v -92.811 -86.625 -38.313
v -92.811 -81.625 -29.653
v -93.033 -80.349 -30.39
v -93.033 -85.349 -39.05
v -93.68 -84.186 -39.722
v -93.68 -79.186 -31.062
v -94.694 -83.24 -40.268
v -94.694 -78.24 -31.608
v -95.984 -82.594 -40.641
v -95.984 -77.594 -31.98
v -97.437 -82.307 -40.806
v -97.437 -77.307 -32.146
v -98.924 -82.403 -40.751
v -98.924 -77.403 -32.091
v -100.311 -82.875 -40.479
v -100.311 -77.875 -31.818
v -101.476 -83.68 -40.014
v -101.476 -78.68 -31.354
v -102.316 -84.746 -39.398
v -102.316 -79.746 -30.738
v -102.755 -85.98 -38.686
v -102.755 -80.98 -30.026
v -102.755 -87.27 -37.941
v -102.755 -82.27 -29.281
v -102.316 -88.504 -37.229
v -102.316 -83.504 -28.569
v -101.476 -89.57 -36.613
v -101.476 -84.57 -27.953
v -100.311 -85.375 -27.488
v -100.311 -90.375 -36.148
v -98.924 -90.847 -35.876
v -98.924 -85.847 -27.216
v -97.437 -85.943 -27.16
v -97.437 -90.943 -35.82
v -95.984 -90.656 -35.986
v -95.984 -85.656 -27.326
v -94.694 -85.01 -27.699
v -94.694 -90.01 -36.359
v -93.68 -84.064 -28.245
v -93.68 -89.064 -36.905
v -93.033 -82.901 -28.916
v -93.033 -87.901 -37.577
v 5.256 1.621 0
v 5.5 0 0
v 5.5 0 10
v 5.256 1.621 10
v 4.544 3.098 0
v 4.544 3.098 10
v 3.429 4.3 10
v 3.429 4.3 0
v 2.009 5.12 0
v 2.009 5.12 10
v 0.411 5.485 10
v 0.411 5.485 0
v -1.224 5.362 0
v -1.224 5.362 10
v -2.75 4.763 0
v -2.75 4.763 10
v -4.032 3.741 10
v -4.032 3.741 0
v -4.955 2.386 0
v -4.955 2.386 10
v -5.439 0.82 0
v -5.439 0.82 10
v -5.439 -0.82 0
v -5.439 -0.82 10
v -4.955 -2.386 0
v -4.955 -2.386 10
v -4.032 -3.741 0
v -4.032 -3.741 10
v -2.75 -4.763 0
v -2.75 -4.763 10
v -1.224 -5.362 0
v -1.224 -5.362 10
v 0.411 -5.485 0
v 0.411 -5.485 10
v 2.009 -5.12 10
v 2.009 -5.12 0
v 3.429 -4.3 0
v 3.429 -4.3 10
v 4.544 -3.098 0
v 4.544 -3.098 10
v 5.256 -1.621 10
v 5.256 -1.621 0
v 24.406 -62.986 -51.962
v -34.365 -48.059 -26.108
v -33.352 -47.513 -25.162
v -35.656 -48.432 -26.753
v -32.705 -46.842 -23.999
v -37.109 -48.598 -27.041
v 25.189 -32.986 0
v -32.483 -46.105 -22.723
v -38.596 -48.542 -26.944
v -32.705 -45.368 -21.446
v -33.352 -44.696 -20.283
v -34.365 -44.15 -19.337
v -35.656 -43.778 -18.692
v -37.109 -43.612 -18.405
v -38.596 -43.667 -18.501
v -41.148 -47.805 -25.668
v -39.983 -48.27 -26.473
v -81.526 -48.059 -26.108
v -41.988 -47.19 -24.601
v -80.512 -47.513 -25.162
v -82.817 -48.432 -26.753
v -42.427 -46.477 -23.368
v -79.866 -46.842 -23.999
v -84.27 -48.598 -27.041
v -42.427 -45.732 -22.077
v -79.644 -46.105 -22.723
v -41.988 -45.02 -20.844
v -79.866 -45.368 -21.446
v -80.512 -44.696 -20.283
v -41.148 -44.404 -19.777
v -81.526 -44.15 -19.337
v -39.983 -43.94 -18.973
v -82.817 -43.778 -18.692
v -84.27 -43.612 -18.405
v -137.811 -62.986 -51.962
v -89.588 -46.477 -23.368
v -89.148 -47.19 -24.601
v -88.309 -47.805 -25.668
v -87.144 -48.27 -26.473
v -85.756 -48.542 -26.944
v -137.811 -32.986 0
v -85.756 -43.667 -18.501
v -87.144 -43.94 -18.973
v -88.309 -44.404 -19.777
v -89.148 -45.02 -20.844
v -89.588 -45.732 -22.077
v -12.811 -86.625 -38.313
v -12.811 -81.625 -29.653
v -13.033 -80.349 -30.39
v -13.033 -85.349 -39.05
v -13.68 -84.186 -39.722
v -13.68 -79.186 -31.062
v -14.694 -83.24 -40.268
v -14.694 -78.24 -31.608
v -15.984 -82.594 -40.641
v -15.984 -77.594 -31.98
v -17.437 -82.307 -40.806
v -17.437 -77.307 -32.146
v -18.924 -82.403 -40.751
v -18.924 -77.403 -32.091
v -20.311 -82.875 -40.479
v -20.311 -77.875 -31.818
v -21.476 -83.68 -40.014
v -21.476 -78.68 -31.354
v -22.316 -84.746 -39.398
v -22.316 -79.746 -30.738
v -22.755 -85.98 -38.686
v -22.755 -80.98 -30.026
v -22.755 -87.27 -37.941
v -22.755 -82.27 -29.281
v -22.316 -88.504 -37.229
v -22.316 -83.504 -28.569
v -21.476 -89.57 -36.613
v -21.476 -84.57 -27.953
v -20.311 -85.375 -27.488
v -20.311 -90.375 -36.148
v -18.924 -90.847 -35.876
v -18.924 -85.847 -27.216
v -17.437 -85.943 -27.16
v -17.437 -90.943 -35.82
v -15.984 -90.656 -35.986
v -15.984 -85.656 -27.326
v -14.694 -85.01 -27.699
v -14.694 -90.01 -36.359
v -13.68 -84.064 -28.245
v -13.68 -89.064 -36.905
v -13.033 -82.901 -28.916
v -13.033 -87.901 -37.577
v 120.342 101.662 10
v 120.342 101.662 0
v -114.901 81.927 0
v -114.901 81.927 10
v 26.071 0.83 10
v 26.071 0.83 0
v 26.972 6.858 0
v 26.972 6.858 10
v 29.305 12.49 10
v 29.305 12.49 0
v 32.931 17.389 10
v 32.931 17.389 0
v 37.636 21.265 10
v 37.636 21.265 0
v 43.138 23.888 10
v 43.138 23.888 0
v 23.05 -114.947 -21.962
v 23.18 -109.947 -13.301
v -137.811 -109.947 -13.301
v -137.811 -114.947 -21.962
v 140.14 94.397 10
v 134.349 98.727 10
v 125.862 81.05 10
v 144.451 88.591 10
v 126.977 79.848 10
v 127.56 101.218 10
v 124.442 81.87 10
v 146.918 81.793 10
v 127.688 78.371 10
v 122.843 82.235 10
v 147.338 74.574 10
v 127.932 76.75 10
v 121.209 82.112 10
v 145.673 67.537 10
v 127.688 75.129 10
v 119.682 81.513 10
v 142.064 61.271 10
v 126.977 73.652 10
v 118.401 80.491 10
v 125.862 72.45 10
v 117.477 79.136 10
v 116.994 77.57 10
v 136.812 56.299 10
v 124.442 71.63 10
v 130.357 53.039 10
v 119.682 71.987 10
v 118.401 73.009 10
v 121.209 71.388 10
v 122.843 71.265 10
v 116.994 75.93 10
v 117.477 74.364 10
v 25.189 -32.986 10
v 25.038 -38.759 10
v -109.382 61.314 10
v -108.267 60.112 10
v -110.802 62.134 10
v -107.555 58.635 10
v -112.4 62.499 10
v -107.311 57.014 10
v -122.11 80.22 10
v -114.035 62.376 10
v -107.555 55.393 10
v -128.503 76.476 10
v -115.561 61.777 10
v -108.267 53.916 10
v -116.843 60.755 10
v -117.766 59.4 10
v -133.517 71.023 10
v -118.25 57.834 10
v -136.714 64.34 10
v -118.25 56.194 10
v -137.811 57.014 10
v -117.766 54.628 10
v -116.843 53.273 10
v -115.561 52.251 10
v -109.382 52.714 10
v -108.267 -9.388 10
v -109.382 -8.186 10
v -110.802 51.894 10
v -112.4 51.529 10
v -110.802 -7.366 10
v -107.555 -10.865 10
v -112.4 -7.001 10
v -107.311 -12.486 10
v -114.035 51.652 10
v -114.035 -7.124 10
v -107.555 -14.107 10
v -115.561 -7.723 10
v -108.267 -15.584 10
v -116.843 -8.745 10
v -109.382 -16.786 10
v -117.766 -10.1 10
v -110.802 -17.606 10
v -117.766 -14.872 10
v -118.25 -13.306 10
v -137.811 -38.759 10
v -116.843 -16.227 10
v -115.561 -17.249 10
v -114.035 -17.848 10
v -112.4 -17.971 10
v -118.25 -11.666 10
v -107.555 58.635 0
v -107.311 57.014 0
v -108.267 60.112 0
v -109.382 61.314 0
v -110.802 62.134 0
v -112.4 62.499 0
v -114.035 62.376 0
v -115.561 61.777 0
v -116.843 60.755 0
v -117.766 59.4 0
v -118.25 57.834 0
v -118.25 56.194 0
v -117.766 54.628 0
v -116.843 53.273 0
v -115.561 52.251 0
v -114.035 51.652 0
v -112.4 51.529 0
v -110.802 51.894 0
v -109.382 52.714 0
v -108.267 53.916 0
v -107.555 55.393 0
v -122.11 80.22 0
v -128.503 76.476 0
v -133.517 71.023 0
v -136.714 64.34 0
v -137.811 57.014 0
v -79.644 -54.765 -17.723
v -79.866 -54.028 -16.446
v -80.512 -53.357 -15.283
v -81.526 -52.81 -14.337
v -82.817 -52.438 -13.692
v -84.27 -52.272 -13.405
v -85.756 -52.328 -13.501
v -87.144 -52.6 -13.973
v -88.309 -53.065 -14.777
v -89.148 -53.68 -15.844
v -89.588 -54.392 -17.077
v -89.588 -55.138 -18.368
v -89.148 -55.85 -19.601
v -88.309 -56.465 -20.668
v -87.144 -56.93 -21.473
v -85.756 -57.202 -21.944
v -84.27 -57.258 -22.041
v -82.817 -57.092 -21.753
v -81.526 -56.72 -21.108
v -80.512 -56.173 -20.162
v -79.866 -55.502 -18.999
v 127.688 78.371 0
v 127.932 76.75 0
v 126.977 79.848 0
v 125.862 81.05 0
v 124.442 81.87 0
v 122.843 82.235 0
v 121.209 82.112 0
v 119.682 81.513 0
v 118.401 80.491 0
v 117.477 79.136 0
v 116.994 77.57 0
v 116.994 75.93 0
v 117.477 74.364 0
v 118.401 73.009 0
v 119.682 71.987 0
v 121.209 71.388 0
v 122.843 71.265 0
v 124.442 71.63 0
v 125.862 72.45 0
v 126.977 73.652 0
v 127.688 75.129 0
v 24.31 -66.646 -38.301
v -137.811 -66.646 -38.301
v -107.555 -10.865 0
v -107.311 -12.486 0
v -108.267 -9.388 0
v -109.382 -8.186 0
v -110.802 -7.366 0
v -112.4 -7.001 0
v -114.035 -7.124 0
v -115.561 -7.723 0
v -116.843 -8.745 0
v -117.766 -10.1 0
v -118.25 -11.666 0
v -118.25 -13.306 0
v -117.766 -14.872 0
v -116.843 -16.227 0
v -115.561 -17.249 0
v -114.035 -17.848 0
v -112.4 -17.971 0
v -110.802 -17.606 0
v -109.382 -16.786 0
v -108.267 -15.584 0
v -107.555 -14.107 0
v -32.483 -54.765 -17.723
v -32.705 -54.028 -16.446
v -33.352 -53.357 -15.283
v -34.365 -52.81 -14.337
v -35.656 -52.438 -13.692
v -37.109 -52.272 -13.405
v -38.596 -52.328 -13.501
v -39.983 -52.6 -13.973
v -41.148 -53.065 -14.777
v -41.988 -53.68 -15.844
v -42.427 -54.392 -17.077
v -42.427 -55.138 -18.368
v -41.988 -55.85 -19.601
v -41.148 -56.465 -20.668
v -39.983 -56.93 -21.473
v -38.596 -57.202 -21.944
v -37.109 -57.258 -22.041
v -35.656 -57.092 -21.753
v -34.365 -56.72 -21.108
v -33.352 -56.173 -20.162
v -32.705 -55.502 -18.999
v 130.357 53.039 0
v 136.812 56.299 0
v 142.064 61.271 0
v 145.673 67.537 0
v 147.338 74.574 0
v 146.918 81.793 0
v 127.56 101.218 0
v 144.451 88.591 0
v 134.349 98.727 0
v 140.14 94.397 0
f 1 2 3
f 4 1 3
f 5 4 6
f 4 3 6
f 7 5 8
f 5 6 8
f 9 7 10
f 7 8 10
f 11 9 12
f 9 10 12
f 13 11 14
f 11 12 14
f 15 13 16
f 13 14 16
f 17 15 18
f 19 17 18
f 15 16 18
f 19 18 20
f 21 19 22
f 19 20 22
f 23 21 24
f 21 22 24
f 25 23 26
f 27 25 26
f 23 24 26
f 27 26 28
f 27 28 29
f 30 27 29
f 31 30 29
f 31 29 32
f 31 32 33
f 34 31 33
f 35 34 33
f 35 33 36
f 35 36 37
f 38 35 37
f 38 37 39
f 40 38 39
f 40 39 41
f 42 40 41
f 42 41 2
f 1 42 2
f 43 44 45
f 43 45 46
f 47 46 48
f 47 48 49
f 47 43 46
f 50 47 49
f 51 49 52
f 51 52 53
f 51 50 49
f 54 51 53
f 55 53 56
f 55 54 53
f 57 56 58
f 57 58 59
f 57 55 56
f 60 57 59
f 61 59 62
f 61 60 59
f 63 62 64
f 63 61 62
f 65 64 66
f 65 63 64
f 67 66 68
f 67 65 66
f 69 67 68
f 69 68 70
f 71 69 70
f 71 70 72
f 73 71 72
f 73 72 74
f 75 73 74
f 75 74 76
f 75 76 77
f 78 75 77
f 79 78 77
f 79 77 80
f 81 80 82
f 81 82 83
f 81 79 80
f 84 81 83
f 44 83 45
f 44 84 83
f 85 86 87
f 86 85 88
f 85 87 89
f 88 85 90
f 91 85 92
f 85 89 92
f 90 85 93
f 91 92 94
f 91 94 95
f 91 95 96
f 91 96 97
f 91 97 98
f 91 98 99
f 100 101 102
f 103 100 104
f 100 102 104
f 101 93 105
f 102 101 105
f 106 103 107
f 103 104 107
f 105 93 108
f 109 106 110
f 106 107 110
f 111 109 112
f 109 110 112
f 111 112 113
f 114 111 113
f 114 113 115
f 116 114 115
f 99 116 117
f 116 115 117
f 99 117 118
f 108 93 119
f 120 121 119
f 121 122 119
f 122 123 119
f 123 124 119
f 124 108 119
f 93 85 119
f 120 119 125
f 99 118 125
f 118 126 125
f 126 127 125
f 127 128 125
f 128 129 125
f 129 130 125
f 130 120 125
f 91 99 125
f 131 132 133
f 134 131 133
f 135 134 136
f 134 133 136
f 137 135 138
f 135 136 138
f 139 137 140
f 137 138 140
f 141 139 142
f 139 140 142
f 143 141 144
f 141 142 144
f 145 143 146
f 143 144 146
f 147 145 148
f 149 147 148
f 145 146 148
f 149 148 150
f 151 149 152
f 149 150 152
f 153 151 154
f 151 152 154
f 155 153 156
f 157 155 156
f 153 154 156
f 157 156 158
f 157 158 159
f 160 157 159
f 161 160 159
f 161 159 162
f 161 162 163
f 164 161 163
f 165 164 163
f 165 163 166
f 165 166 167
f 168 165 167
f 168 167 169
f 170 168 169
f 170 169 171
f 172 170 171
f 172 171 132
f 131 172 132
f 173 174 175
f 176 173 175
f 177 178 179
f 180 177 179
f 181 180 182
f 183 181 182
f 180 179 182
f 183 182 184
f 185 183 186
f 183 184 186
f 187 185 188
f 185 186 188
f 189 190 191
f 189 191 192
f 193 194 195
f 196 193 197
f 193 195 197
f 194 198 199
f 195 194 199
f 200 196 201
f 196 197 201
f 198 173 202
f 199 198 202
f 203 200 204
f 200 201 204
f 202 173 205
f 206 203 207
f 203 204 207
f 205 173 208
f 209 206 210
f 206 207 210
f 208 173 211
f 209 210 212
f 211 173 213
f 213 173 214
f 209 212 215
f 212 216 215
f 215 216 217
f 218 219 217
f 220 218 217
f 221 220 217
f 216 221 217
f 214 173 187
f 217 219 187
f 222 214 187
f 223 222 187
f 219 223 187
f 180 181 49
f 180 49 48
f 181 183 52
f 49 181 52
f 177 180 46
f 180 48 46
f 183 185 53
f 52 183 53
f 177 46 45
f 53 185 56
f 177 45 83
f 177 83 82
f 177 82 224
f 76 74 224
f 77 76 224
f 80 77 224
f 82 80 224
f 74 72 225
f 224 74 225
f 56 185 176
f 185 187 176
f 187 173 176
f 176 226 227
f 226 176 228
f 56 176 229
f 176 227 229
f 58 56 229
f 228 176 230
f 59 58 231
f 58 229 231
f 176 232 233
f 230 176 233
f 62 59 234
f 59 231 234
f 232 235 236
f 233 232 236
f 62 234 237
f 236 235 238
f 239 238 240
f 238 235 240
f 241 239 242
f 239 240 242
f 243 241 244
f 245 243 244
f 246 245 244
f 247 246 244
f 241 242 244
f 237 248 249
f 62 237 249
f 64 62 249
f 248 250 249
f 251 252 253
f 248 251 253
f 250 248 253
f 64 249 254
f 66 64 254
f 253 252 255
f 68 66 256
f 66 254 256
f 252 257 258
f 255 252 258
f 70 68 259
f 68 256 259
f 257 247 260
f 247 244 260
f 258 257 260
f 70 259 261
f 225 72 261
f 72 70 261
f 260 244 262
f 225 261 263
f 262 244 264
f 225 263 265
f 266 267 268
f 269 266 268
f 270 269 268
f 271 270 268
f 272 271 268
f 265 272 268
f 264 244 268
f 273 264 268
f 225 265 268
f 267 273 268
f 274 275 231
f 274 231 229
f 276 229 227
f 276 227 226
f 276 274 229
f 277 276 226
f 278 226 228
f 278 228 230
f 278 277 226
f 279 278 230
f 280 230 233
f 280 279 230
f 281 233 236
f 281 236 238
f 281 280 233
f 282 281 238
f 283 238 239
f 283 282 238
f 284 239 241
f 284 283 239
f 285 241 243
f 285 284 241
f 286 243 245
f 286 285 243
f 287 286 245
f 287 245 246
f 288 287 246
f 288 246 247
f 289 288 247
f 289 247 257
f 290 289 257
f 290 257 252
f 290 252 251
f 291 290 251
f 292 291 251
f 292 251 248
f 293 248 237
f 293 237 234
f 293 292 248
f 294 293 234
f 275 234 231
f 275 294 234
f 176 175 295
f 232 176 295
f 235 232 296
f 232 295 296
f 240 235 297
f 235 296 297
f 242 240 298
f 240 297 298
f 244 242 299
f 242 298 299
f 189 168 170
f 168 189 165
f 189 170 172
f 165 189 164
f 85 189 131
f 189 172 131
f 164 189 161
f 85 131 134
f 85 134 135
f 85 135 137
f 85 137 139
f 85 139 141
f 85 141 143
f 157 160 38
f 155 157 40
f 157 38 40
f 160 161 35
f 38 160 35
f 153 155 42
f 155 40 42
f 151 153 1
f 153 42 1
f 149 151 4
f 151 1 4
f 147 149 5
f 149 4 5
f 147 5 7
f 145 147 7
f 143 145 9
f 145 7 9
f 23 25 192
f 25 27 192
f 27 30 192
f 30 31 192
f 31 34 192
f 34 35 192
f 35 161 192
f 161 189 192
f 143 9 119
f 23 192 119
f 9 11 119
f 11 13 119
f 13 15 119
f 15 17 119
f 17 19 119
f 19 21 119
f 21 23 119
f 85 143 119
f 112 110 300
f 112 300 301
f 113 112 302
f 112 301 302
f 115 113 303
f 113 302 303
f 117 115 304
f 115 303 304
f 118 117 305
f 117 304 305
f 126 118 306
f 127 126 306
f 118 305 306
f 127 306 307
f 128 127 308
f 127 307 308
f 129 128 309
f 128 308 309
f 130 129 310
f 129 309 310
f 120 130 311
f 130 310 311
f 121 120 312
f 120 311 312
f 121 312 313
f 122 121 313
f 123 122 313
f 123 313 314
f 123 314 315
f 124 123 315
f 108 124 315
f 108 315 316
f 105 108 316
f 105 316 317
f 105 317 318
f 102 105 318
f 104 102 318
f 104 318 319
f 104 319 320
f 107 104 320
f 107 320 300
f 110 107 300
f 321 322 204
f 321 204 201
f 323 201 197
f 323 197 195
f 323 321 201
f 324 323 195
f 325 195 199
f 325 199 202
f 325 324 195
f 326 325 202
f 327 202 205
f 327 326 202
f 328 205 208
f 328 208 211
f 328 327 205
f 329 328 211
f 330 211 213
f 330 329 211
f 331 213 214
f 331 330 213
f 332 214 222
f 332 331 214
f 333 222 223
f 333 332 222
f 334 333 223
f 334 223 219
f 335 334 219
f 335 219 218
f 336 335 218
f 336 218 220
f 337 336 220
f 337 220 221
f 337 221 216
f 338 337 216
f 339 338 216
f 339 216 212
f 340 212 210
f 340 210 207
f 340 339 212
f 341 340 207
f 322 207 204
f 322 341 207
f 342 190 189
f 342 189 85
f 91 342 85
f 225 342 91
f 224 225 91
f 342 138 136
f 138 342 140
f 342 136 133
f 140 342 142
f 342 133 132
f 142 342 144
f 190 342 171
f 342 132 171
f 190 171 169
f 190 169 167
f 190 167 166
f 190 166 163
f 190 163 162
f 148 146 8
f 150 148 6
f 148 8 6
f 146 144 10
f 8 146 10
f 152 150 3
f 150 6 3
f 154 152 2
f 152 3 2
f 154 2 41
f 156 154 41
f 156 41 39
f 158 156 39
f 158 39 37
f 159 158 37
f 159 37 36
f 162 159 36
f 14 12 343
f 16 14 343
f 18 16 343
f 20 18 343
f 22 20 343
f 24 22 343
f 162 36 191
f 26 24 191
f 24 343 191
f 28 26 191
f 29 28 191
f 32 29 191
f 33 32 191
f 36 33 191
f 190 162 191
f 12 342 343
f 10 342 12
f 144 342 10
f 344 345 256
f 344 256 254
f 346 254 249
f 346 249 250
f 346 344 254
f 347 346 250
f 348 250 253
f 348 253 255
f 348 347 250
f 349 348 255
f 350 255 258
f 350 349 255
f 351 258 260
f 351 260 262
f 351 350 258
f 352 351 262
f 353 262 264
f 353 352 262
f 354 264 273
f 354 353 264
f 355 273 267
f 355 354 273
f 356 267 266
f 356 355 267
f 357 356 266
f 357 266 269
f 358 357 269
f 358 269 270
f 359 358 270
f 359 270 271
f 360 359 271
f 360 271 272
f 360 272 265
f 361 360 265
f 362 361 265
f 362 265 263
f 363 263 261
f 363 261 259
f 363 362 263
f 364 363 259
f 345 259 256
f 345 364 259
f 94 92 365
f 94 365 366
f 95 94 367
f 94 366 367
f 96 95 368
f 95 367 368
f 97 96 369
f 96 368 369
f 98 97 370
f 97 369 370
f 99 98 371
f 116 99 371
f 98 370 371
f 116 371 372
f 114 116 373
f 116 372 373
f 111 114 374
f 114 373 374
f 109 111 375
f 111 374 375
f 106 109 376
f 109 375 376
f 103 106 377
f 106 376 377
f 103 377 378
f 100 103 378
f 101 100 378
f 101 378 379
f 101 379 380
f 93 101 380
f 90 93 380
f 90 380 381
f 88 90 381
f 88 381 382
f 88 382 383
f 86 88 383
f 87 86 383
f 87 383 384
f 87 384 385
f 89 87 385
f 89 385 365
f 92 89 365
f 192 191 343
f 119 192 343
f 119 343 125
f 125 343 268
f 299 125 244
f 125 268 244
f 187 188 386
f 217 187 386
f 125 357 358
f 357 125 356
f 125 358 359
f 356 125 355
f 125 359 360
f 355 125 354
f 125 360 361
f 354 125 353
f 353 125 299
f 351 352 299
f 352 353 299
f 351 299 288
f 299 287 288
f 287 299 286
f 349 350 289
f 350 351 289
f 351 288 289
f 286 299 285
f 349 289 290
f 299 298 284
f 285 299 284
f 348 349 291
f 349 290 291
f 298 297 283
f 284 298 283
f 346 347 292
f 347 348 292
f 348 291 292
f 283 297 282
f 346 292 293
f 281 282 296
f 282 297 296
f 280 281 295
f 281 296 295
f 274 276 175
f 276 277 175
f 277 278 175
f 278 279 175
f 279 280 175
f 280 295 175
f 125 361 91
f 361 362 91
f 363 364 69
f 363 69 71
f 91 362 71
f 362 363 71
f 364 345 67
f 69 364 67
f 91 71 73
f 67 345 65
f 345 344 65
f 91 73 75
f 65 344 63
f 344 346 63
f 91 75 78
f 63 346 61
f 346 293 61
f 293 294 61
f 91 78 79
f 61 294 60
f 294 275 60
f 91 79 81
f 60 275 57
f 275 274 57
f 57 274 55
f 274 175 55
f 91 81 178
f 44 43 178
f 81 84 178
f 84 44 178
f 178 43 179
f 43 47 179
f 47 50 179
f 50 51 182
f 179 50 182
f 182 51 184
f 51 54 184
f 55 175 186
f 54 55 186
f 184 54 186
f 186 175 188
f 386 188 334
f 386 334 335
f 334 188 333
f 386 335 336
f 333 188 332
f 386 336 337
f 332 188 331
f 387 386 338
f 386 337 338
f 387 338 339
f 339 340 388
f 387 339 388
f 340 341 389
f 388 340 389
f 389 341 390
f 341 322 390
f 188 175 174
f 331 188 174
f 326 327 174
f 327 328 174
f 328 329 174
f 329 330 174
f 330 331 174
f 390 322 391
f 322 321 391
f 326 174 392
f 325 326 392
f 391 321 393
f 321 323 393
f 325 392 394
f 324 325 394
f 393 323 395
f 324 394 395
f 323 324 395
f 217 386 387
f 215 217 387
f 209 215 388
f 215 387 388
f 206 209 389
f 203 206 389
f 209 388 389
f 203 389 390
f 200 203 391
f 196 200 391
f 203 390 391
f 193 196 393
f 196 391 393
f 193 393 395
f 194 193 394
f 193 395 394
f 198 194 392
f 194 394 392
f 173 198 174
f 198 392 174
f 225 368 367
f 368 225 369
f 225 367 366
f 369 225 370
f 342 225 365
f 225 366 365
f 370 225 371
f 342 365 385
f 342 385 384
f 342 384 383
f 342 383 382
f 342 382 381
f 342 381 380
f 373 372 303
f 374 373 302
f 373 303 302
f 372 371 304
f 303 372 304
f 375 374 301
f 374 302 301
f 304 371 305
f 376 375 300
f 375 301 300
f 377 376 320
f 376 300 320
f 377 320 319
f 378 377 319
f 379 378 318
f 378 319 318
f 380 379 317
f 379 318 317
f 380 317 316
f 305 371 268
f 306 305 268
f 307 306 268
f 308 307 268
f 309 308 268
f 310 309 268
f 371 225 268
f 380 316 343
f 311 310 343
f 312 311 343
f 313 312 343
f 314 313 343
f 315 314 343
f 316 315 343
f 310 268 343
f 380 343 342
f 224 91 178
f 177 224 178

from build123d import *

# Parameters (mm, degrees)
F0_R     = 5.5
F1_DEPTH = 10
F3_DEPTH = 137.8111356168
F4_REACH = 250.1802781517
F5_R     = 5
F6_DEPTH = 152.6664515987
F7_R     = 5
F8_DEPTH = 35.9817621135


with BuildPart() as f1:
    # F0 (on Top) → F1 (new body)
    with BuildSketch(Plane.XY):
        with BuildLine():
            ThreePointArc((-114.9011806829, 81.9265817605), (-131.2129171427, 73.936702076), (-137.8111356168, 57.0141007194))
            Line((-137.8111356168, 57.0141007194), (-137.8111356168, -32.9858992806))
            Line((-137.8111356168, -32.9858992806), (25.1888643832, -32.9858992806))
            Line((25.1888643832, -32.9858992806), (26.0714058339, 0.8295803985))
            ThreePointArc((26.0714058339, 0.8295803985), (30.9682705236, 15.0503307045), (43.1380721252, 23.8880313122))
            Line((43.1380721252, 23.8880313122), (130.3572190405, 53.0392771455))
            ThreePointArc((130.3572190405, 53.0392771455), (146.9184021007, 81.7933335256), (120.3423502221, 101.6624555296))
            Line((120.3423502221, 101.6624555296), (-114.9011806829, 81.9265817605))
        make_face()
        with Locations((-112.8111356168, -12.4858992806)):
            Circle(F0_R, mode=Mode.SUBTRACT)
        Circle(F0_R, mode=Mode.SUBTRACT)
        with Locations((-112.8111356168, 57.0141007194)):
            Circle(F0_R, mode=Mode.SUBTRACT)
        with Locations((122.4323952882, 76.7499744885)):
            Circle(F0_R, mode=Mode.SUBTRACT)
    extrude(amount=F1_DEPTH)

    # F2 (on Right) → F3 (join, through all)
    with BuildSketch(Plane.YZ):
        Polygon((-38.7594019725, 10), (-66.6461533184, -38.3012701892), (-109.9474235076, -13.3012701892), (-114.9474235076, -21.9615242271), (-62.9858992806, -51.9615242271), (-32.9858992806, 0), (-32.9858992806, 10), align=None)
    extrude(amount=-F3_DEPTH)

    f4_end = Plane(origin=(25.6301351085, -16.078159441, 5), x_dir=(0.0260898572, 0.9996596017, 0), z_dir=(0.9996596017, -0.0260898572, 0))
    # F2 (on Right) → F4 (join, up to a plane its end follows)
    with BuildSketch(Plane.YZ):
        Polygon((-38.7594019725, 10), (-66.6461533184, -38.3012701892), (-109.9474235076, -13.3012701892), (-114.9474235076, -21.9615242271), (-62.9858992806, -51.9615242271), (-32.9858992806, 0), (-32.9858992806, 10), align=None)
    f4_long = extrude(amount=F4_REACH, mode=Mode.PRIVATE)
    add(split(f4_long, bisect_by=f4_end, keep=Keep.BOTTOM, mode=Mode.PRIVATE))

    # F5 (on face) → F6 (cut, through all)
    with BuildSketch(Plane(origin=(0, -33.3996784983, 19.2833133718), x_dir=(1, 0, 0), z_dir=(0, -0.8660254038, 0.5))):
        with Locations((-84.6435874701, -42.7307449281)):
            Circle(F5_R)
        with Locations((-37.48293221, -42.7307449281)):
            Circle(F5_R)
    extrude(amount=-F6_DEPTH, mode=Mode.SUBTRACT)

    # F7 (on face) → F8 (cut, through all)
    with BuildSketch(Plane(origin=(0, -33.2464748201, -57.584583561), x_dir=(1, 0, 0), z_dir=(0, 0.5, 0.8660254038))):
        with Locations((-97.8111356168, -55.862698704)):
            Circle(F7_R)
        with Locations((-17.8111356168, -55.862698704)):
            Circle(F7_R)
    extrude(amount=-F8_DEPTH, mode=Mode.SUBTRACT)


solid = f1.part
